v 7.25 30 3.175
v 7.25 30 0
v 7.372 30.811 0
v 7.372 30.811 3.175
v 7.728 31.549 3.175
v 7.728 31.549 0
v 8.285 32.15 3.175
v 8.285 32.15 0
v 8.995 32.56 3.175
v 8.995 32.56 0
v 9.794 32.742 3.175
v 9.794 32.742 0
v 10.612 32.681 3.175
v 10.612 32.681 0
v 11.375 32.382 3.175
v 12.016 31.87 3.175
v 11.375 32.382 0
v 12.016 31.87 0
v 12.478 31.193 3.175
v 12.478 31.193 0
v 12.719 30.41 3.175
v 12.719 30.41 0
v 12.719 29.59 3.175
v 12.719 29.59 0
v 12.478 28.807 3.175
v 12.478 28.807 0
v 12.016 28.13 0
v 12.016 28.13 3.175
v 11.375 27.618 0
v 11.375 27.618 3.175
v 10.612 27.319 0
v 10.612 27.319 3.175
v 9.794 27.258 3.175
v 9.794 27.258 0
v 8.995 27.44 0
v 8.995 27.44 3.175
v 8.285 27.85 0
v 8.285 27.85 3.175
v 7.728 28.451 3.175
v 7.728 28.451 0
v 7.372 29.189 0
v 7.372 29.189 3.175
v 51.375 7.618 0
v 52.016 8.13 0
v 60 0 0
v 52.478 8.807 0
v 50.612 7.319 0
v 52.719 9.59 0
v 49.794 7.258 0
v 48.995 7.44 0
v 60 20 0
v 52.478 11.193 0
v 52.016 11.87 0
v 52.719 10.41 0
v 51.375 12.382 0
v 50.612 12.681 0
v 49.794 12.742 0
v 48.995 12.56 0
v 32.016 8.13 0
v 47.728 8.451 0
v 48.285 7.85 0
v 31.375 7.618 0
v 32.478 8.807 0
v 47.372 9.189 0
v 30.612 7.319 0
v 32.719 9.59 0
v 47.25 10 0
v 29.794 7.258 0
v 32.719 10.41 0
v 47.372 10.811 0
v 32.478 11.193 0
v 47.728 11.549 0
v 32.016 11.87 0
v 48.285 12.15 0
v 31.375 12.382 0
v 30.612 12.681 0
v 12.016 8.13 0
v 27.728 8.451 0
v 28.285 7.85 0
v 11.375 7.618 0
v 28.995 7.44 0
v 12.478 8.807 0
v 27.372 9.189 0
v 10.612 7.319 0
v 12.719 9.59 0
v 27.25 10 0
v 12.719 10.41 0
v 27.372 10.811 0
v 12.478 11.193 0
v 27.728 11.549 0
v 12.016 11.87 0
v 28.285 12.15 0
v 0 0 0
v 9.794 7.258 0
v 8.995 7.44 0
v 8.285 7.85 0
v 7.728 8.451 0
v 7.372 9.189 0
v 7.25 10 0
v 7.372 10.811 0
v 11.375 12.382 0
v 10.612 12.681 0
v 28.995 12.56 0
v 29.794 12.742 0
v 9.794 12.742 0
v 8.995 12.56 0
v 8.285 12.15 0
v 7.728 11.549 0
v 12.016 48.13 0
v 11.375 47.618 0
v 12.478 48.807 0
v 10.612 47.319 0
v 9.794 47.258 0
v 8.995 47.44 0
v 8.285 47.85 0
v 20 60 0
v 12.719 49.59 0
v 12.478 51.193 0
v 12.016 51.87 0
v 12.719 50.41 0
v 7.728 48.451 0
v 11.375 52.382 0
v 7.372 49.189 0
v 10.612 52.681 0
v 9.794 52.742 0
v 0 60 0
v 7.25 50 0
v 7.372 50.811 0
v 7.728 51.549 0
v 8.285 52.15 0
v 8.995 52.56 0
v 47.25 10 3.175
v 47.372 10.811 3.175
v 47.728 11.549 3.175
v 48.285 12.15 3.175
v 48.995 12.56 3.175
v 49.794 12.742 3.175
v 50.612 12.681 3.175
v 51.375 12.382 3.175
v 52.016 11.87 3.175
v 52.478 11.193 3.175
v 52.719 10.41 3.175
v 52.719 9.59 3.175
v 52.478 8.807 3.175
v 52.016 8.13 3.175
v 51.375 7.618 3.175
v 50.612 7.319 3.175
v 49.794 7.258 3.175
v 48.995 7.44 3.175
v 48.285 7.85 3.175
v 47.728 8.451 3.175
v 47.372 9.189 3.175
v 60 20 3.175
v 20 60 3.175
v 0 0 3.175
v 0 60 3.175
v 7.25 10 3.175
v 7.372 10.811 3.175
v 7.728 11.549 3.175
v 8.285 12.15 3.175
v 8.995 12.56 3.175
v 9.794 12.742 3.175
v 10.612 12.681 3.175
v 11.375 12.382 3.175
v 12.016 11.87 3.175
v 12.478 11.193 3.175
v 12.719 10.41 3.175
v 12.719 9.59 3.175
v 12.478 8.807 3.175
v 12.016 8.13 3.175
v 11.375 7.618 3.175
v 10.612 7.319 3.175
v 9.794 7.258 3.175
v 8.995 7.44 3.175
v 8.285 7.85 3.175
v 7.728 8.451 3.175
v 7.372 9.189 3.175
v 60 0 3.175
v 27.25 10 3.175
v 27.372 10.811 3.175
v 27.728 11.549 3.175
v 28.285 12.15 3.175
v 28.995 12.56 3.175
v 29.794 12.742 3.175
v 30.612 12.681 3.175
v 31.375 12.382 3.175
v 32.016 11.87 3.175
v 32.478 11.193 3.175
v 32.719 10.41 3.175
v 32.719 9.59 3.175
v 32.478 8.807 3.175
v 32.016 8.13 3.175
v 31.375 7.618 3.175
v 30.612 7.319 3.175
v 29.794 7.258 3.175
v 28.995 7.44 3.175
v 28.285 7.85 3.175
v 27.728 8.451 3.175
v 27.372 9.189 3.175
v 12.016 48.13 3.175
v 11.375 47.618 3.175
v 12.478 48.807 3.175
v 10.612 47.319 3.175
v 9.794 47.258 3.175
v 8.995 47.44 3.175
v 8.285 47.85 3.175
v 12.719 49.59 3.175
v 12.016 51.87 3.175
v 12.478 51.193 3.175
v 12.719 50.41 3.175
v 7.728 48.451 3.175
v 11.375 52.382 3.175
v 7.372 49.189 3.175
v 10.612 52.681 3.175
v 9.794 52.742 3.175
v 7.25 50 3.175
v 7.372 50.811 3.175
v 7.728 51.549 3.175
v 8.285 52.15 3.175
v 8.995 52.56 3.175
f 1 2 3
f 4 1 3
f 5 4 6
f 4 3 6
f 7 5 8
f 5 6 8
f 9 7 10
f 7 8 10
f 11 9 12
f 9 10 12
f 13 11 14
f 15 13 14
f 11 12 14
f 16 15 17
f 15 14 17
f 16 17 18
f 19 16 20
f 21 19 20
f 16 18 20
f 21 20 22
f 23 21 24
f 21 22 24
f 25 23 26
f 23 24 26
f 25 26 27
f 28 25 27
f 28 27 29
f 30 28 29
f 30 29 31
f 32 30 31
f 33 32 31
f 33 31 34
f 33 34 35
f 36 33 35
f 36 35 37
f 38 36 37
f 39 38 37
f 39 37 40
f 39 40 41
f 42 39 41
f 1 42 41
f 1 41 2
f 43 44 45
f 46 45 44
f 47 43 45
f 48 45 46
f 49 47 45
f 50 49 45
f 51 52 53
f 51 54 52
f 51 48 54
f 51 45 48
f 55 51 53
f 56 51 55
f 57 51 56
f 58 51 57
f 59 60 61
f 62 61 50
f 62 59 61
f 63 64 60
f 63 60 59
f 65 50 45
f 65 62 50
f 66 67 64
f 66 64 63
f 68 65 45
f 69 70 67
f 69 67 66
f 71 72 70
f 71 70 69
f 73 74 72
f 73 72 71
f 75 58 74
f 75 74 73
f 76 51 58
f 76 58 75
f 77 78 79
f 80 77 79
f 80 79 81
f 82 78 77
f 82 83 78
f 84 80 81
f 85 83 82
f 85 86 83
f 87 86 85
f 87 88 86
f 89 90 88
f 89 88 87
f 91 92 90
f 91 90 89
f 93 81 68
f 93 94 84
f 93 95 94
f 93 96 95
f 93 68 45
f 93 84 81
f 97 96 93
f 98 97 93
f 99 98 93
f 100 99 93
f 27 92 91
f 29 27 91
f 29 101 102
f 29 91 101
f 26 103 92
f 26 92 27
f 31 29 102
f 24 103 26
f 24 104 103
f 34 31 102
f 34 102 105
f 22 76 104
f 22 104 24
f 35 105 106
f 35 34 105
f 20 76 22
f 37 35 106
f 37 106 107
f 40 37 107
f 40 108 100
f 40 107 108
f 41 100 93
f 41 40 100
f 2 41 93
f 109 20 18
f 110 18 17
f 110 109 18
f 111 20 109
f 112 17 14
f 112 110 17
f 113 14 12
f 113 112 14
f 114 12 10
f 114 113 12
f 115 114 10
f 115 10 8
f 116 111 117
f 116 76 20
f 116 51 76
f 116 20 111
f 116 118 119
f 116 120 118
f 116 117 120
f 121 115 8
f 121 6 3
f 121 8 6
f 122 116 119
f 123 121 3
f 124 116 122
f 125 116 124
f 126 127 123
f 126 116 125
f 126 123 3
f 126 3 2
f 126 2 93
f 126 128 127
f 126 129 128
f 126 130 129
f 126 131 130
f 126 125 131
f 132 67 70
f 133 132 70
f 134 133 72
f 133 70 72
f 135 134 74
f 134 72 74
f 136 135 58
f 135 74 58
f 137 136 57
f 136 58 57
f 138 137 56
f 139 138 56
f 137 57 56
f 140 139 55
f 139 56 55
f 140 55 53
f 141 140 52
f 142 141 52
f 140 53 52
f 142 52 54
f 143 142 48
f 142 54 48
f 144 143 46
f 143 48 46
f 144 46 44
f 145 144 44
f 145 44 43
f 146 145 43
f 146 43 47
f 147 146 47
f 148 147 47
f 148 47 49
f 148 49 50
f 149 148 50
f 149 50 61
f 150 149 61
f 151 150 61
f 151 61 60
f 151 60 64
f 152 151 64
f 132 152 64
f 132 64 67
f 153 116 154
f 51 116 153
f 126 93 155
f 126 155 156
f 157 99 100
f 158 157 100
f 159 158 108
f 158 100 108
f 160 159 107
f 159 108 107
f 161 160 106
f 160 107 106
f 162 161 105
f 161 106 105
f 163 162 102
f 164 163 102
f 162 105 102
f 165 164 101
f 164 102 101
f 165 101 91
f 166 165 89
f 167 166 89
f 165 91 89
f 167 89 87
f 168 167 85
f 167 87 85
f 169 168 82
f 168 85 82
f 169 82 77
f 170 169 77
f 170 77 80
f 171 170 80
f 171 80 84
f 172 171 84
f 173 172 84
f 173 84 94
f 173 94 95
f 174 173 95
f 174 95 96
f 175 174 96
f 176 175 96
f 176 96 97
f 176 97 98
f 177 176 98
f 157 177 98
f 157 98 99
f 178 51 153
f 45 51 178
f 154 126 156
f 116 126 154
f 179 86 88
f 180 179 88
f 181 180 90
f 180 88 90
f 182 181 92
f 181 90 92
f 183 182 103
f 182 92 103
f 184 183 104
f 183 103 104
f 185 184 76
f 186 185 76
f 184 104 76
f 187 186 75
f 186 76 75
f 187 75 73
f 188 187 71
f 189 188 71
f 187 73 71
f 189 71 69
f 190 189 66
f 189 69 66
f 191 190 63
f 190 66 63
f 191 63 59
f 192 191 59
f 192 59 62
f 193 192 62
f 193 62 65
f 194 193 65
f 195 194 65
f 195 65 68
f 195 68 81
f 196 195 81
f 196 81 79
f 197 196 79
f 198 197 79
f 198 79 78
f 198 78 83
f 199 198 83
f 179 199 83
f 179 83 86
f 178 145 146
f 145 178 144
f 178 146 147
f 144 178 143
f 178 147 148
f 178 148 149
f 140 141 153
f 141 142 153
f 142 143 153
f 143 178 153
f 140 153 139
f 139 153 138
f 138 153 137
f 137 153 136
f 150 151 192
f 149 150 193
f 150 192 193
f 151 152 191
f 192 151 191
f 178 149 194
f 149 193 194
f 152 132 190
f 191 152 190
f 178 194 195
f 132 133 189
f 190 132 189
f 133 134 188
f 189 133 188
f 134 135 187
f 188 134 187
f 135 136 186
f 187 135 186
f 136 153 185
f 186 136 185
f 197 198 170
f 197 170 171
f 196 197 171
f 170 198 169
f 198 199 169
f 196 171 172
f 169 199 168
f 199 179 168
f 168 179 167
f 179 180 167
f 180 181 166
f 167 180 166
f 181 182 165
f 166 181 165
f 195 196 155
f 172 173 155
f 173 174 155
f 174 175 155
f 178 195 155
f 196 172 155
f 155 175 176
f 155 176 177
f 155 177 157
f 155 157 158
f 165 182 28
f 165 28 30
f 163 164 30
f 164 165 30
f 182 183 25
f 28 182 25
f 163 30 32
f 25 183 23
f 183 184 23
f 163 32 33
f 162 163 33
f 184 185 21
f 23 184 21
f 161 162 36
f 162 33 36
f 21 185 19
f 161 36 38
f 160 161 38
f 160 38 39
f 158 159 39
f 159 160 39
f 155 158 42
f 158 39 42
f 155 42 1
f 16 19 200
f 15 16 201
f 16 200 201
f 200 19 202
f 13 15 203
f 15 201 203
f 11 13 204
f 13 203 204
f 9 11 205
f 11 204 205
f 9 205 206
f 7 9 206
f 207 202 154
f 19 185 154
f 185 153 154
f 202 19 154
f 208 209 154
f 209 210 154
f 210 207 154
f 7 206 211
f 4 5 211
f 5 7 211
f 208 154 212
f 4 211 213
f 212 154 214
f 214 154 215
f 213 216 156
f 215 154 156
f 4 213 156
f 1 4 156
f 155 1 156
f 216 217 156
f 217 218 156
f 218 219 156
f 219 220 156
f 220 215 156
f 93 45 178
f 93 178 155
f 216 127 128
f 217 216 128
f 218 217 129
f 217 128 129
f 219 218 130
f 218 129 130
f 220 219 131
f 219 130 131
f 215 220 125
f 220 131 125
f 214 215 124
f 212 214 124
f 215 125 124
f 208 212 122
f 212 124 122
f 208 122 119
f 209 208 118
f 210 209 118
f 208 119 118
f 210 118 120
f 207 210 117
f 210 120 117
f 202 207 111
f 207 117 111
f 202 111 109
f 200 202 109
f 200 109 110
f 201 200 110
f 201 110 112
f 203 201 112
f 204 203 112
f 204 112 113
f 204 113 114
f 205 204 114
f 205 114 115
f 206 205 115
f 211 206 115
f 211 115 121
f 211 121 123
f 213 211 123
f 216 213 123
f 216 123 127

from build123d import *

# Parameters (mm, degrees)
BOSS_EXTRUDE1_DEPTH  = 3.175
M5_CLEARANCE_HOLE1_D = 5.5
LPATTERN1_COUNT      = 3
LPATTERN1_PITCH      = 20
LPATTERN2_COUNT      = 3
LPATTERN2_PITCH      = 20


with BuildPart() as part:
    # Sketch1 → Boss-Extrude1 (new body)
    with BuildSketch(Plane.XY):
        Polygon((0, 0), (0, 60), (20, 60), (60, 20), (60, 0), align=None)
    extrude(amount=BOSS_EXTRUDE1_DEPTH)

    # M5 Clearance Hole1 (through all)
    with Locations(Plane(origin=(10, 10, 3.175), x_dir=(1, 0, 0), z_dir=(0, 0, 1))):
        with Locations((0, 0)):
            m5_clearance_hole1 = Hole(M5_CLEARANCE_HOLE1_D / 2)

    # LPattern1: M5 Clearance Hole1 ×3
    with Locations(*[(i * LPATTERN1_PITCH, 0, 0) for i in range(1, LPATTERN1_COUNT)]):
        add(m5_clearance_hole1, mode=Mode.SUBTRACT)

    # LPattern2: M5 Clearance Hole1 ×3
    with Locations(*[(0, i * LPATTERN2_PITCH, 0) for i in range(1, LPATTERN2_COUNT)]):
        add(m5_clearance_hole1, mode=Mode.SUBTRACT)


solid = part.part
